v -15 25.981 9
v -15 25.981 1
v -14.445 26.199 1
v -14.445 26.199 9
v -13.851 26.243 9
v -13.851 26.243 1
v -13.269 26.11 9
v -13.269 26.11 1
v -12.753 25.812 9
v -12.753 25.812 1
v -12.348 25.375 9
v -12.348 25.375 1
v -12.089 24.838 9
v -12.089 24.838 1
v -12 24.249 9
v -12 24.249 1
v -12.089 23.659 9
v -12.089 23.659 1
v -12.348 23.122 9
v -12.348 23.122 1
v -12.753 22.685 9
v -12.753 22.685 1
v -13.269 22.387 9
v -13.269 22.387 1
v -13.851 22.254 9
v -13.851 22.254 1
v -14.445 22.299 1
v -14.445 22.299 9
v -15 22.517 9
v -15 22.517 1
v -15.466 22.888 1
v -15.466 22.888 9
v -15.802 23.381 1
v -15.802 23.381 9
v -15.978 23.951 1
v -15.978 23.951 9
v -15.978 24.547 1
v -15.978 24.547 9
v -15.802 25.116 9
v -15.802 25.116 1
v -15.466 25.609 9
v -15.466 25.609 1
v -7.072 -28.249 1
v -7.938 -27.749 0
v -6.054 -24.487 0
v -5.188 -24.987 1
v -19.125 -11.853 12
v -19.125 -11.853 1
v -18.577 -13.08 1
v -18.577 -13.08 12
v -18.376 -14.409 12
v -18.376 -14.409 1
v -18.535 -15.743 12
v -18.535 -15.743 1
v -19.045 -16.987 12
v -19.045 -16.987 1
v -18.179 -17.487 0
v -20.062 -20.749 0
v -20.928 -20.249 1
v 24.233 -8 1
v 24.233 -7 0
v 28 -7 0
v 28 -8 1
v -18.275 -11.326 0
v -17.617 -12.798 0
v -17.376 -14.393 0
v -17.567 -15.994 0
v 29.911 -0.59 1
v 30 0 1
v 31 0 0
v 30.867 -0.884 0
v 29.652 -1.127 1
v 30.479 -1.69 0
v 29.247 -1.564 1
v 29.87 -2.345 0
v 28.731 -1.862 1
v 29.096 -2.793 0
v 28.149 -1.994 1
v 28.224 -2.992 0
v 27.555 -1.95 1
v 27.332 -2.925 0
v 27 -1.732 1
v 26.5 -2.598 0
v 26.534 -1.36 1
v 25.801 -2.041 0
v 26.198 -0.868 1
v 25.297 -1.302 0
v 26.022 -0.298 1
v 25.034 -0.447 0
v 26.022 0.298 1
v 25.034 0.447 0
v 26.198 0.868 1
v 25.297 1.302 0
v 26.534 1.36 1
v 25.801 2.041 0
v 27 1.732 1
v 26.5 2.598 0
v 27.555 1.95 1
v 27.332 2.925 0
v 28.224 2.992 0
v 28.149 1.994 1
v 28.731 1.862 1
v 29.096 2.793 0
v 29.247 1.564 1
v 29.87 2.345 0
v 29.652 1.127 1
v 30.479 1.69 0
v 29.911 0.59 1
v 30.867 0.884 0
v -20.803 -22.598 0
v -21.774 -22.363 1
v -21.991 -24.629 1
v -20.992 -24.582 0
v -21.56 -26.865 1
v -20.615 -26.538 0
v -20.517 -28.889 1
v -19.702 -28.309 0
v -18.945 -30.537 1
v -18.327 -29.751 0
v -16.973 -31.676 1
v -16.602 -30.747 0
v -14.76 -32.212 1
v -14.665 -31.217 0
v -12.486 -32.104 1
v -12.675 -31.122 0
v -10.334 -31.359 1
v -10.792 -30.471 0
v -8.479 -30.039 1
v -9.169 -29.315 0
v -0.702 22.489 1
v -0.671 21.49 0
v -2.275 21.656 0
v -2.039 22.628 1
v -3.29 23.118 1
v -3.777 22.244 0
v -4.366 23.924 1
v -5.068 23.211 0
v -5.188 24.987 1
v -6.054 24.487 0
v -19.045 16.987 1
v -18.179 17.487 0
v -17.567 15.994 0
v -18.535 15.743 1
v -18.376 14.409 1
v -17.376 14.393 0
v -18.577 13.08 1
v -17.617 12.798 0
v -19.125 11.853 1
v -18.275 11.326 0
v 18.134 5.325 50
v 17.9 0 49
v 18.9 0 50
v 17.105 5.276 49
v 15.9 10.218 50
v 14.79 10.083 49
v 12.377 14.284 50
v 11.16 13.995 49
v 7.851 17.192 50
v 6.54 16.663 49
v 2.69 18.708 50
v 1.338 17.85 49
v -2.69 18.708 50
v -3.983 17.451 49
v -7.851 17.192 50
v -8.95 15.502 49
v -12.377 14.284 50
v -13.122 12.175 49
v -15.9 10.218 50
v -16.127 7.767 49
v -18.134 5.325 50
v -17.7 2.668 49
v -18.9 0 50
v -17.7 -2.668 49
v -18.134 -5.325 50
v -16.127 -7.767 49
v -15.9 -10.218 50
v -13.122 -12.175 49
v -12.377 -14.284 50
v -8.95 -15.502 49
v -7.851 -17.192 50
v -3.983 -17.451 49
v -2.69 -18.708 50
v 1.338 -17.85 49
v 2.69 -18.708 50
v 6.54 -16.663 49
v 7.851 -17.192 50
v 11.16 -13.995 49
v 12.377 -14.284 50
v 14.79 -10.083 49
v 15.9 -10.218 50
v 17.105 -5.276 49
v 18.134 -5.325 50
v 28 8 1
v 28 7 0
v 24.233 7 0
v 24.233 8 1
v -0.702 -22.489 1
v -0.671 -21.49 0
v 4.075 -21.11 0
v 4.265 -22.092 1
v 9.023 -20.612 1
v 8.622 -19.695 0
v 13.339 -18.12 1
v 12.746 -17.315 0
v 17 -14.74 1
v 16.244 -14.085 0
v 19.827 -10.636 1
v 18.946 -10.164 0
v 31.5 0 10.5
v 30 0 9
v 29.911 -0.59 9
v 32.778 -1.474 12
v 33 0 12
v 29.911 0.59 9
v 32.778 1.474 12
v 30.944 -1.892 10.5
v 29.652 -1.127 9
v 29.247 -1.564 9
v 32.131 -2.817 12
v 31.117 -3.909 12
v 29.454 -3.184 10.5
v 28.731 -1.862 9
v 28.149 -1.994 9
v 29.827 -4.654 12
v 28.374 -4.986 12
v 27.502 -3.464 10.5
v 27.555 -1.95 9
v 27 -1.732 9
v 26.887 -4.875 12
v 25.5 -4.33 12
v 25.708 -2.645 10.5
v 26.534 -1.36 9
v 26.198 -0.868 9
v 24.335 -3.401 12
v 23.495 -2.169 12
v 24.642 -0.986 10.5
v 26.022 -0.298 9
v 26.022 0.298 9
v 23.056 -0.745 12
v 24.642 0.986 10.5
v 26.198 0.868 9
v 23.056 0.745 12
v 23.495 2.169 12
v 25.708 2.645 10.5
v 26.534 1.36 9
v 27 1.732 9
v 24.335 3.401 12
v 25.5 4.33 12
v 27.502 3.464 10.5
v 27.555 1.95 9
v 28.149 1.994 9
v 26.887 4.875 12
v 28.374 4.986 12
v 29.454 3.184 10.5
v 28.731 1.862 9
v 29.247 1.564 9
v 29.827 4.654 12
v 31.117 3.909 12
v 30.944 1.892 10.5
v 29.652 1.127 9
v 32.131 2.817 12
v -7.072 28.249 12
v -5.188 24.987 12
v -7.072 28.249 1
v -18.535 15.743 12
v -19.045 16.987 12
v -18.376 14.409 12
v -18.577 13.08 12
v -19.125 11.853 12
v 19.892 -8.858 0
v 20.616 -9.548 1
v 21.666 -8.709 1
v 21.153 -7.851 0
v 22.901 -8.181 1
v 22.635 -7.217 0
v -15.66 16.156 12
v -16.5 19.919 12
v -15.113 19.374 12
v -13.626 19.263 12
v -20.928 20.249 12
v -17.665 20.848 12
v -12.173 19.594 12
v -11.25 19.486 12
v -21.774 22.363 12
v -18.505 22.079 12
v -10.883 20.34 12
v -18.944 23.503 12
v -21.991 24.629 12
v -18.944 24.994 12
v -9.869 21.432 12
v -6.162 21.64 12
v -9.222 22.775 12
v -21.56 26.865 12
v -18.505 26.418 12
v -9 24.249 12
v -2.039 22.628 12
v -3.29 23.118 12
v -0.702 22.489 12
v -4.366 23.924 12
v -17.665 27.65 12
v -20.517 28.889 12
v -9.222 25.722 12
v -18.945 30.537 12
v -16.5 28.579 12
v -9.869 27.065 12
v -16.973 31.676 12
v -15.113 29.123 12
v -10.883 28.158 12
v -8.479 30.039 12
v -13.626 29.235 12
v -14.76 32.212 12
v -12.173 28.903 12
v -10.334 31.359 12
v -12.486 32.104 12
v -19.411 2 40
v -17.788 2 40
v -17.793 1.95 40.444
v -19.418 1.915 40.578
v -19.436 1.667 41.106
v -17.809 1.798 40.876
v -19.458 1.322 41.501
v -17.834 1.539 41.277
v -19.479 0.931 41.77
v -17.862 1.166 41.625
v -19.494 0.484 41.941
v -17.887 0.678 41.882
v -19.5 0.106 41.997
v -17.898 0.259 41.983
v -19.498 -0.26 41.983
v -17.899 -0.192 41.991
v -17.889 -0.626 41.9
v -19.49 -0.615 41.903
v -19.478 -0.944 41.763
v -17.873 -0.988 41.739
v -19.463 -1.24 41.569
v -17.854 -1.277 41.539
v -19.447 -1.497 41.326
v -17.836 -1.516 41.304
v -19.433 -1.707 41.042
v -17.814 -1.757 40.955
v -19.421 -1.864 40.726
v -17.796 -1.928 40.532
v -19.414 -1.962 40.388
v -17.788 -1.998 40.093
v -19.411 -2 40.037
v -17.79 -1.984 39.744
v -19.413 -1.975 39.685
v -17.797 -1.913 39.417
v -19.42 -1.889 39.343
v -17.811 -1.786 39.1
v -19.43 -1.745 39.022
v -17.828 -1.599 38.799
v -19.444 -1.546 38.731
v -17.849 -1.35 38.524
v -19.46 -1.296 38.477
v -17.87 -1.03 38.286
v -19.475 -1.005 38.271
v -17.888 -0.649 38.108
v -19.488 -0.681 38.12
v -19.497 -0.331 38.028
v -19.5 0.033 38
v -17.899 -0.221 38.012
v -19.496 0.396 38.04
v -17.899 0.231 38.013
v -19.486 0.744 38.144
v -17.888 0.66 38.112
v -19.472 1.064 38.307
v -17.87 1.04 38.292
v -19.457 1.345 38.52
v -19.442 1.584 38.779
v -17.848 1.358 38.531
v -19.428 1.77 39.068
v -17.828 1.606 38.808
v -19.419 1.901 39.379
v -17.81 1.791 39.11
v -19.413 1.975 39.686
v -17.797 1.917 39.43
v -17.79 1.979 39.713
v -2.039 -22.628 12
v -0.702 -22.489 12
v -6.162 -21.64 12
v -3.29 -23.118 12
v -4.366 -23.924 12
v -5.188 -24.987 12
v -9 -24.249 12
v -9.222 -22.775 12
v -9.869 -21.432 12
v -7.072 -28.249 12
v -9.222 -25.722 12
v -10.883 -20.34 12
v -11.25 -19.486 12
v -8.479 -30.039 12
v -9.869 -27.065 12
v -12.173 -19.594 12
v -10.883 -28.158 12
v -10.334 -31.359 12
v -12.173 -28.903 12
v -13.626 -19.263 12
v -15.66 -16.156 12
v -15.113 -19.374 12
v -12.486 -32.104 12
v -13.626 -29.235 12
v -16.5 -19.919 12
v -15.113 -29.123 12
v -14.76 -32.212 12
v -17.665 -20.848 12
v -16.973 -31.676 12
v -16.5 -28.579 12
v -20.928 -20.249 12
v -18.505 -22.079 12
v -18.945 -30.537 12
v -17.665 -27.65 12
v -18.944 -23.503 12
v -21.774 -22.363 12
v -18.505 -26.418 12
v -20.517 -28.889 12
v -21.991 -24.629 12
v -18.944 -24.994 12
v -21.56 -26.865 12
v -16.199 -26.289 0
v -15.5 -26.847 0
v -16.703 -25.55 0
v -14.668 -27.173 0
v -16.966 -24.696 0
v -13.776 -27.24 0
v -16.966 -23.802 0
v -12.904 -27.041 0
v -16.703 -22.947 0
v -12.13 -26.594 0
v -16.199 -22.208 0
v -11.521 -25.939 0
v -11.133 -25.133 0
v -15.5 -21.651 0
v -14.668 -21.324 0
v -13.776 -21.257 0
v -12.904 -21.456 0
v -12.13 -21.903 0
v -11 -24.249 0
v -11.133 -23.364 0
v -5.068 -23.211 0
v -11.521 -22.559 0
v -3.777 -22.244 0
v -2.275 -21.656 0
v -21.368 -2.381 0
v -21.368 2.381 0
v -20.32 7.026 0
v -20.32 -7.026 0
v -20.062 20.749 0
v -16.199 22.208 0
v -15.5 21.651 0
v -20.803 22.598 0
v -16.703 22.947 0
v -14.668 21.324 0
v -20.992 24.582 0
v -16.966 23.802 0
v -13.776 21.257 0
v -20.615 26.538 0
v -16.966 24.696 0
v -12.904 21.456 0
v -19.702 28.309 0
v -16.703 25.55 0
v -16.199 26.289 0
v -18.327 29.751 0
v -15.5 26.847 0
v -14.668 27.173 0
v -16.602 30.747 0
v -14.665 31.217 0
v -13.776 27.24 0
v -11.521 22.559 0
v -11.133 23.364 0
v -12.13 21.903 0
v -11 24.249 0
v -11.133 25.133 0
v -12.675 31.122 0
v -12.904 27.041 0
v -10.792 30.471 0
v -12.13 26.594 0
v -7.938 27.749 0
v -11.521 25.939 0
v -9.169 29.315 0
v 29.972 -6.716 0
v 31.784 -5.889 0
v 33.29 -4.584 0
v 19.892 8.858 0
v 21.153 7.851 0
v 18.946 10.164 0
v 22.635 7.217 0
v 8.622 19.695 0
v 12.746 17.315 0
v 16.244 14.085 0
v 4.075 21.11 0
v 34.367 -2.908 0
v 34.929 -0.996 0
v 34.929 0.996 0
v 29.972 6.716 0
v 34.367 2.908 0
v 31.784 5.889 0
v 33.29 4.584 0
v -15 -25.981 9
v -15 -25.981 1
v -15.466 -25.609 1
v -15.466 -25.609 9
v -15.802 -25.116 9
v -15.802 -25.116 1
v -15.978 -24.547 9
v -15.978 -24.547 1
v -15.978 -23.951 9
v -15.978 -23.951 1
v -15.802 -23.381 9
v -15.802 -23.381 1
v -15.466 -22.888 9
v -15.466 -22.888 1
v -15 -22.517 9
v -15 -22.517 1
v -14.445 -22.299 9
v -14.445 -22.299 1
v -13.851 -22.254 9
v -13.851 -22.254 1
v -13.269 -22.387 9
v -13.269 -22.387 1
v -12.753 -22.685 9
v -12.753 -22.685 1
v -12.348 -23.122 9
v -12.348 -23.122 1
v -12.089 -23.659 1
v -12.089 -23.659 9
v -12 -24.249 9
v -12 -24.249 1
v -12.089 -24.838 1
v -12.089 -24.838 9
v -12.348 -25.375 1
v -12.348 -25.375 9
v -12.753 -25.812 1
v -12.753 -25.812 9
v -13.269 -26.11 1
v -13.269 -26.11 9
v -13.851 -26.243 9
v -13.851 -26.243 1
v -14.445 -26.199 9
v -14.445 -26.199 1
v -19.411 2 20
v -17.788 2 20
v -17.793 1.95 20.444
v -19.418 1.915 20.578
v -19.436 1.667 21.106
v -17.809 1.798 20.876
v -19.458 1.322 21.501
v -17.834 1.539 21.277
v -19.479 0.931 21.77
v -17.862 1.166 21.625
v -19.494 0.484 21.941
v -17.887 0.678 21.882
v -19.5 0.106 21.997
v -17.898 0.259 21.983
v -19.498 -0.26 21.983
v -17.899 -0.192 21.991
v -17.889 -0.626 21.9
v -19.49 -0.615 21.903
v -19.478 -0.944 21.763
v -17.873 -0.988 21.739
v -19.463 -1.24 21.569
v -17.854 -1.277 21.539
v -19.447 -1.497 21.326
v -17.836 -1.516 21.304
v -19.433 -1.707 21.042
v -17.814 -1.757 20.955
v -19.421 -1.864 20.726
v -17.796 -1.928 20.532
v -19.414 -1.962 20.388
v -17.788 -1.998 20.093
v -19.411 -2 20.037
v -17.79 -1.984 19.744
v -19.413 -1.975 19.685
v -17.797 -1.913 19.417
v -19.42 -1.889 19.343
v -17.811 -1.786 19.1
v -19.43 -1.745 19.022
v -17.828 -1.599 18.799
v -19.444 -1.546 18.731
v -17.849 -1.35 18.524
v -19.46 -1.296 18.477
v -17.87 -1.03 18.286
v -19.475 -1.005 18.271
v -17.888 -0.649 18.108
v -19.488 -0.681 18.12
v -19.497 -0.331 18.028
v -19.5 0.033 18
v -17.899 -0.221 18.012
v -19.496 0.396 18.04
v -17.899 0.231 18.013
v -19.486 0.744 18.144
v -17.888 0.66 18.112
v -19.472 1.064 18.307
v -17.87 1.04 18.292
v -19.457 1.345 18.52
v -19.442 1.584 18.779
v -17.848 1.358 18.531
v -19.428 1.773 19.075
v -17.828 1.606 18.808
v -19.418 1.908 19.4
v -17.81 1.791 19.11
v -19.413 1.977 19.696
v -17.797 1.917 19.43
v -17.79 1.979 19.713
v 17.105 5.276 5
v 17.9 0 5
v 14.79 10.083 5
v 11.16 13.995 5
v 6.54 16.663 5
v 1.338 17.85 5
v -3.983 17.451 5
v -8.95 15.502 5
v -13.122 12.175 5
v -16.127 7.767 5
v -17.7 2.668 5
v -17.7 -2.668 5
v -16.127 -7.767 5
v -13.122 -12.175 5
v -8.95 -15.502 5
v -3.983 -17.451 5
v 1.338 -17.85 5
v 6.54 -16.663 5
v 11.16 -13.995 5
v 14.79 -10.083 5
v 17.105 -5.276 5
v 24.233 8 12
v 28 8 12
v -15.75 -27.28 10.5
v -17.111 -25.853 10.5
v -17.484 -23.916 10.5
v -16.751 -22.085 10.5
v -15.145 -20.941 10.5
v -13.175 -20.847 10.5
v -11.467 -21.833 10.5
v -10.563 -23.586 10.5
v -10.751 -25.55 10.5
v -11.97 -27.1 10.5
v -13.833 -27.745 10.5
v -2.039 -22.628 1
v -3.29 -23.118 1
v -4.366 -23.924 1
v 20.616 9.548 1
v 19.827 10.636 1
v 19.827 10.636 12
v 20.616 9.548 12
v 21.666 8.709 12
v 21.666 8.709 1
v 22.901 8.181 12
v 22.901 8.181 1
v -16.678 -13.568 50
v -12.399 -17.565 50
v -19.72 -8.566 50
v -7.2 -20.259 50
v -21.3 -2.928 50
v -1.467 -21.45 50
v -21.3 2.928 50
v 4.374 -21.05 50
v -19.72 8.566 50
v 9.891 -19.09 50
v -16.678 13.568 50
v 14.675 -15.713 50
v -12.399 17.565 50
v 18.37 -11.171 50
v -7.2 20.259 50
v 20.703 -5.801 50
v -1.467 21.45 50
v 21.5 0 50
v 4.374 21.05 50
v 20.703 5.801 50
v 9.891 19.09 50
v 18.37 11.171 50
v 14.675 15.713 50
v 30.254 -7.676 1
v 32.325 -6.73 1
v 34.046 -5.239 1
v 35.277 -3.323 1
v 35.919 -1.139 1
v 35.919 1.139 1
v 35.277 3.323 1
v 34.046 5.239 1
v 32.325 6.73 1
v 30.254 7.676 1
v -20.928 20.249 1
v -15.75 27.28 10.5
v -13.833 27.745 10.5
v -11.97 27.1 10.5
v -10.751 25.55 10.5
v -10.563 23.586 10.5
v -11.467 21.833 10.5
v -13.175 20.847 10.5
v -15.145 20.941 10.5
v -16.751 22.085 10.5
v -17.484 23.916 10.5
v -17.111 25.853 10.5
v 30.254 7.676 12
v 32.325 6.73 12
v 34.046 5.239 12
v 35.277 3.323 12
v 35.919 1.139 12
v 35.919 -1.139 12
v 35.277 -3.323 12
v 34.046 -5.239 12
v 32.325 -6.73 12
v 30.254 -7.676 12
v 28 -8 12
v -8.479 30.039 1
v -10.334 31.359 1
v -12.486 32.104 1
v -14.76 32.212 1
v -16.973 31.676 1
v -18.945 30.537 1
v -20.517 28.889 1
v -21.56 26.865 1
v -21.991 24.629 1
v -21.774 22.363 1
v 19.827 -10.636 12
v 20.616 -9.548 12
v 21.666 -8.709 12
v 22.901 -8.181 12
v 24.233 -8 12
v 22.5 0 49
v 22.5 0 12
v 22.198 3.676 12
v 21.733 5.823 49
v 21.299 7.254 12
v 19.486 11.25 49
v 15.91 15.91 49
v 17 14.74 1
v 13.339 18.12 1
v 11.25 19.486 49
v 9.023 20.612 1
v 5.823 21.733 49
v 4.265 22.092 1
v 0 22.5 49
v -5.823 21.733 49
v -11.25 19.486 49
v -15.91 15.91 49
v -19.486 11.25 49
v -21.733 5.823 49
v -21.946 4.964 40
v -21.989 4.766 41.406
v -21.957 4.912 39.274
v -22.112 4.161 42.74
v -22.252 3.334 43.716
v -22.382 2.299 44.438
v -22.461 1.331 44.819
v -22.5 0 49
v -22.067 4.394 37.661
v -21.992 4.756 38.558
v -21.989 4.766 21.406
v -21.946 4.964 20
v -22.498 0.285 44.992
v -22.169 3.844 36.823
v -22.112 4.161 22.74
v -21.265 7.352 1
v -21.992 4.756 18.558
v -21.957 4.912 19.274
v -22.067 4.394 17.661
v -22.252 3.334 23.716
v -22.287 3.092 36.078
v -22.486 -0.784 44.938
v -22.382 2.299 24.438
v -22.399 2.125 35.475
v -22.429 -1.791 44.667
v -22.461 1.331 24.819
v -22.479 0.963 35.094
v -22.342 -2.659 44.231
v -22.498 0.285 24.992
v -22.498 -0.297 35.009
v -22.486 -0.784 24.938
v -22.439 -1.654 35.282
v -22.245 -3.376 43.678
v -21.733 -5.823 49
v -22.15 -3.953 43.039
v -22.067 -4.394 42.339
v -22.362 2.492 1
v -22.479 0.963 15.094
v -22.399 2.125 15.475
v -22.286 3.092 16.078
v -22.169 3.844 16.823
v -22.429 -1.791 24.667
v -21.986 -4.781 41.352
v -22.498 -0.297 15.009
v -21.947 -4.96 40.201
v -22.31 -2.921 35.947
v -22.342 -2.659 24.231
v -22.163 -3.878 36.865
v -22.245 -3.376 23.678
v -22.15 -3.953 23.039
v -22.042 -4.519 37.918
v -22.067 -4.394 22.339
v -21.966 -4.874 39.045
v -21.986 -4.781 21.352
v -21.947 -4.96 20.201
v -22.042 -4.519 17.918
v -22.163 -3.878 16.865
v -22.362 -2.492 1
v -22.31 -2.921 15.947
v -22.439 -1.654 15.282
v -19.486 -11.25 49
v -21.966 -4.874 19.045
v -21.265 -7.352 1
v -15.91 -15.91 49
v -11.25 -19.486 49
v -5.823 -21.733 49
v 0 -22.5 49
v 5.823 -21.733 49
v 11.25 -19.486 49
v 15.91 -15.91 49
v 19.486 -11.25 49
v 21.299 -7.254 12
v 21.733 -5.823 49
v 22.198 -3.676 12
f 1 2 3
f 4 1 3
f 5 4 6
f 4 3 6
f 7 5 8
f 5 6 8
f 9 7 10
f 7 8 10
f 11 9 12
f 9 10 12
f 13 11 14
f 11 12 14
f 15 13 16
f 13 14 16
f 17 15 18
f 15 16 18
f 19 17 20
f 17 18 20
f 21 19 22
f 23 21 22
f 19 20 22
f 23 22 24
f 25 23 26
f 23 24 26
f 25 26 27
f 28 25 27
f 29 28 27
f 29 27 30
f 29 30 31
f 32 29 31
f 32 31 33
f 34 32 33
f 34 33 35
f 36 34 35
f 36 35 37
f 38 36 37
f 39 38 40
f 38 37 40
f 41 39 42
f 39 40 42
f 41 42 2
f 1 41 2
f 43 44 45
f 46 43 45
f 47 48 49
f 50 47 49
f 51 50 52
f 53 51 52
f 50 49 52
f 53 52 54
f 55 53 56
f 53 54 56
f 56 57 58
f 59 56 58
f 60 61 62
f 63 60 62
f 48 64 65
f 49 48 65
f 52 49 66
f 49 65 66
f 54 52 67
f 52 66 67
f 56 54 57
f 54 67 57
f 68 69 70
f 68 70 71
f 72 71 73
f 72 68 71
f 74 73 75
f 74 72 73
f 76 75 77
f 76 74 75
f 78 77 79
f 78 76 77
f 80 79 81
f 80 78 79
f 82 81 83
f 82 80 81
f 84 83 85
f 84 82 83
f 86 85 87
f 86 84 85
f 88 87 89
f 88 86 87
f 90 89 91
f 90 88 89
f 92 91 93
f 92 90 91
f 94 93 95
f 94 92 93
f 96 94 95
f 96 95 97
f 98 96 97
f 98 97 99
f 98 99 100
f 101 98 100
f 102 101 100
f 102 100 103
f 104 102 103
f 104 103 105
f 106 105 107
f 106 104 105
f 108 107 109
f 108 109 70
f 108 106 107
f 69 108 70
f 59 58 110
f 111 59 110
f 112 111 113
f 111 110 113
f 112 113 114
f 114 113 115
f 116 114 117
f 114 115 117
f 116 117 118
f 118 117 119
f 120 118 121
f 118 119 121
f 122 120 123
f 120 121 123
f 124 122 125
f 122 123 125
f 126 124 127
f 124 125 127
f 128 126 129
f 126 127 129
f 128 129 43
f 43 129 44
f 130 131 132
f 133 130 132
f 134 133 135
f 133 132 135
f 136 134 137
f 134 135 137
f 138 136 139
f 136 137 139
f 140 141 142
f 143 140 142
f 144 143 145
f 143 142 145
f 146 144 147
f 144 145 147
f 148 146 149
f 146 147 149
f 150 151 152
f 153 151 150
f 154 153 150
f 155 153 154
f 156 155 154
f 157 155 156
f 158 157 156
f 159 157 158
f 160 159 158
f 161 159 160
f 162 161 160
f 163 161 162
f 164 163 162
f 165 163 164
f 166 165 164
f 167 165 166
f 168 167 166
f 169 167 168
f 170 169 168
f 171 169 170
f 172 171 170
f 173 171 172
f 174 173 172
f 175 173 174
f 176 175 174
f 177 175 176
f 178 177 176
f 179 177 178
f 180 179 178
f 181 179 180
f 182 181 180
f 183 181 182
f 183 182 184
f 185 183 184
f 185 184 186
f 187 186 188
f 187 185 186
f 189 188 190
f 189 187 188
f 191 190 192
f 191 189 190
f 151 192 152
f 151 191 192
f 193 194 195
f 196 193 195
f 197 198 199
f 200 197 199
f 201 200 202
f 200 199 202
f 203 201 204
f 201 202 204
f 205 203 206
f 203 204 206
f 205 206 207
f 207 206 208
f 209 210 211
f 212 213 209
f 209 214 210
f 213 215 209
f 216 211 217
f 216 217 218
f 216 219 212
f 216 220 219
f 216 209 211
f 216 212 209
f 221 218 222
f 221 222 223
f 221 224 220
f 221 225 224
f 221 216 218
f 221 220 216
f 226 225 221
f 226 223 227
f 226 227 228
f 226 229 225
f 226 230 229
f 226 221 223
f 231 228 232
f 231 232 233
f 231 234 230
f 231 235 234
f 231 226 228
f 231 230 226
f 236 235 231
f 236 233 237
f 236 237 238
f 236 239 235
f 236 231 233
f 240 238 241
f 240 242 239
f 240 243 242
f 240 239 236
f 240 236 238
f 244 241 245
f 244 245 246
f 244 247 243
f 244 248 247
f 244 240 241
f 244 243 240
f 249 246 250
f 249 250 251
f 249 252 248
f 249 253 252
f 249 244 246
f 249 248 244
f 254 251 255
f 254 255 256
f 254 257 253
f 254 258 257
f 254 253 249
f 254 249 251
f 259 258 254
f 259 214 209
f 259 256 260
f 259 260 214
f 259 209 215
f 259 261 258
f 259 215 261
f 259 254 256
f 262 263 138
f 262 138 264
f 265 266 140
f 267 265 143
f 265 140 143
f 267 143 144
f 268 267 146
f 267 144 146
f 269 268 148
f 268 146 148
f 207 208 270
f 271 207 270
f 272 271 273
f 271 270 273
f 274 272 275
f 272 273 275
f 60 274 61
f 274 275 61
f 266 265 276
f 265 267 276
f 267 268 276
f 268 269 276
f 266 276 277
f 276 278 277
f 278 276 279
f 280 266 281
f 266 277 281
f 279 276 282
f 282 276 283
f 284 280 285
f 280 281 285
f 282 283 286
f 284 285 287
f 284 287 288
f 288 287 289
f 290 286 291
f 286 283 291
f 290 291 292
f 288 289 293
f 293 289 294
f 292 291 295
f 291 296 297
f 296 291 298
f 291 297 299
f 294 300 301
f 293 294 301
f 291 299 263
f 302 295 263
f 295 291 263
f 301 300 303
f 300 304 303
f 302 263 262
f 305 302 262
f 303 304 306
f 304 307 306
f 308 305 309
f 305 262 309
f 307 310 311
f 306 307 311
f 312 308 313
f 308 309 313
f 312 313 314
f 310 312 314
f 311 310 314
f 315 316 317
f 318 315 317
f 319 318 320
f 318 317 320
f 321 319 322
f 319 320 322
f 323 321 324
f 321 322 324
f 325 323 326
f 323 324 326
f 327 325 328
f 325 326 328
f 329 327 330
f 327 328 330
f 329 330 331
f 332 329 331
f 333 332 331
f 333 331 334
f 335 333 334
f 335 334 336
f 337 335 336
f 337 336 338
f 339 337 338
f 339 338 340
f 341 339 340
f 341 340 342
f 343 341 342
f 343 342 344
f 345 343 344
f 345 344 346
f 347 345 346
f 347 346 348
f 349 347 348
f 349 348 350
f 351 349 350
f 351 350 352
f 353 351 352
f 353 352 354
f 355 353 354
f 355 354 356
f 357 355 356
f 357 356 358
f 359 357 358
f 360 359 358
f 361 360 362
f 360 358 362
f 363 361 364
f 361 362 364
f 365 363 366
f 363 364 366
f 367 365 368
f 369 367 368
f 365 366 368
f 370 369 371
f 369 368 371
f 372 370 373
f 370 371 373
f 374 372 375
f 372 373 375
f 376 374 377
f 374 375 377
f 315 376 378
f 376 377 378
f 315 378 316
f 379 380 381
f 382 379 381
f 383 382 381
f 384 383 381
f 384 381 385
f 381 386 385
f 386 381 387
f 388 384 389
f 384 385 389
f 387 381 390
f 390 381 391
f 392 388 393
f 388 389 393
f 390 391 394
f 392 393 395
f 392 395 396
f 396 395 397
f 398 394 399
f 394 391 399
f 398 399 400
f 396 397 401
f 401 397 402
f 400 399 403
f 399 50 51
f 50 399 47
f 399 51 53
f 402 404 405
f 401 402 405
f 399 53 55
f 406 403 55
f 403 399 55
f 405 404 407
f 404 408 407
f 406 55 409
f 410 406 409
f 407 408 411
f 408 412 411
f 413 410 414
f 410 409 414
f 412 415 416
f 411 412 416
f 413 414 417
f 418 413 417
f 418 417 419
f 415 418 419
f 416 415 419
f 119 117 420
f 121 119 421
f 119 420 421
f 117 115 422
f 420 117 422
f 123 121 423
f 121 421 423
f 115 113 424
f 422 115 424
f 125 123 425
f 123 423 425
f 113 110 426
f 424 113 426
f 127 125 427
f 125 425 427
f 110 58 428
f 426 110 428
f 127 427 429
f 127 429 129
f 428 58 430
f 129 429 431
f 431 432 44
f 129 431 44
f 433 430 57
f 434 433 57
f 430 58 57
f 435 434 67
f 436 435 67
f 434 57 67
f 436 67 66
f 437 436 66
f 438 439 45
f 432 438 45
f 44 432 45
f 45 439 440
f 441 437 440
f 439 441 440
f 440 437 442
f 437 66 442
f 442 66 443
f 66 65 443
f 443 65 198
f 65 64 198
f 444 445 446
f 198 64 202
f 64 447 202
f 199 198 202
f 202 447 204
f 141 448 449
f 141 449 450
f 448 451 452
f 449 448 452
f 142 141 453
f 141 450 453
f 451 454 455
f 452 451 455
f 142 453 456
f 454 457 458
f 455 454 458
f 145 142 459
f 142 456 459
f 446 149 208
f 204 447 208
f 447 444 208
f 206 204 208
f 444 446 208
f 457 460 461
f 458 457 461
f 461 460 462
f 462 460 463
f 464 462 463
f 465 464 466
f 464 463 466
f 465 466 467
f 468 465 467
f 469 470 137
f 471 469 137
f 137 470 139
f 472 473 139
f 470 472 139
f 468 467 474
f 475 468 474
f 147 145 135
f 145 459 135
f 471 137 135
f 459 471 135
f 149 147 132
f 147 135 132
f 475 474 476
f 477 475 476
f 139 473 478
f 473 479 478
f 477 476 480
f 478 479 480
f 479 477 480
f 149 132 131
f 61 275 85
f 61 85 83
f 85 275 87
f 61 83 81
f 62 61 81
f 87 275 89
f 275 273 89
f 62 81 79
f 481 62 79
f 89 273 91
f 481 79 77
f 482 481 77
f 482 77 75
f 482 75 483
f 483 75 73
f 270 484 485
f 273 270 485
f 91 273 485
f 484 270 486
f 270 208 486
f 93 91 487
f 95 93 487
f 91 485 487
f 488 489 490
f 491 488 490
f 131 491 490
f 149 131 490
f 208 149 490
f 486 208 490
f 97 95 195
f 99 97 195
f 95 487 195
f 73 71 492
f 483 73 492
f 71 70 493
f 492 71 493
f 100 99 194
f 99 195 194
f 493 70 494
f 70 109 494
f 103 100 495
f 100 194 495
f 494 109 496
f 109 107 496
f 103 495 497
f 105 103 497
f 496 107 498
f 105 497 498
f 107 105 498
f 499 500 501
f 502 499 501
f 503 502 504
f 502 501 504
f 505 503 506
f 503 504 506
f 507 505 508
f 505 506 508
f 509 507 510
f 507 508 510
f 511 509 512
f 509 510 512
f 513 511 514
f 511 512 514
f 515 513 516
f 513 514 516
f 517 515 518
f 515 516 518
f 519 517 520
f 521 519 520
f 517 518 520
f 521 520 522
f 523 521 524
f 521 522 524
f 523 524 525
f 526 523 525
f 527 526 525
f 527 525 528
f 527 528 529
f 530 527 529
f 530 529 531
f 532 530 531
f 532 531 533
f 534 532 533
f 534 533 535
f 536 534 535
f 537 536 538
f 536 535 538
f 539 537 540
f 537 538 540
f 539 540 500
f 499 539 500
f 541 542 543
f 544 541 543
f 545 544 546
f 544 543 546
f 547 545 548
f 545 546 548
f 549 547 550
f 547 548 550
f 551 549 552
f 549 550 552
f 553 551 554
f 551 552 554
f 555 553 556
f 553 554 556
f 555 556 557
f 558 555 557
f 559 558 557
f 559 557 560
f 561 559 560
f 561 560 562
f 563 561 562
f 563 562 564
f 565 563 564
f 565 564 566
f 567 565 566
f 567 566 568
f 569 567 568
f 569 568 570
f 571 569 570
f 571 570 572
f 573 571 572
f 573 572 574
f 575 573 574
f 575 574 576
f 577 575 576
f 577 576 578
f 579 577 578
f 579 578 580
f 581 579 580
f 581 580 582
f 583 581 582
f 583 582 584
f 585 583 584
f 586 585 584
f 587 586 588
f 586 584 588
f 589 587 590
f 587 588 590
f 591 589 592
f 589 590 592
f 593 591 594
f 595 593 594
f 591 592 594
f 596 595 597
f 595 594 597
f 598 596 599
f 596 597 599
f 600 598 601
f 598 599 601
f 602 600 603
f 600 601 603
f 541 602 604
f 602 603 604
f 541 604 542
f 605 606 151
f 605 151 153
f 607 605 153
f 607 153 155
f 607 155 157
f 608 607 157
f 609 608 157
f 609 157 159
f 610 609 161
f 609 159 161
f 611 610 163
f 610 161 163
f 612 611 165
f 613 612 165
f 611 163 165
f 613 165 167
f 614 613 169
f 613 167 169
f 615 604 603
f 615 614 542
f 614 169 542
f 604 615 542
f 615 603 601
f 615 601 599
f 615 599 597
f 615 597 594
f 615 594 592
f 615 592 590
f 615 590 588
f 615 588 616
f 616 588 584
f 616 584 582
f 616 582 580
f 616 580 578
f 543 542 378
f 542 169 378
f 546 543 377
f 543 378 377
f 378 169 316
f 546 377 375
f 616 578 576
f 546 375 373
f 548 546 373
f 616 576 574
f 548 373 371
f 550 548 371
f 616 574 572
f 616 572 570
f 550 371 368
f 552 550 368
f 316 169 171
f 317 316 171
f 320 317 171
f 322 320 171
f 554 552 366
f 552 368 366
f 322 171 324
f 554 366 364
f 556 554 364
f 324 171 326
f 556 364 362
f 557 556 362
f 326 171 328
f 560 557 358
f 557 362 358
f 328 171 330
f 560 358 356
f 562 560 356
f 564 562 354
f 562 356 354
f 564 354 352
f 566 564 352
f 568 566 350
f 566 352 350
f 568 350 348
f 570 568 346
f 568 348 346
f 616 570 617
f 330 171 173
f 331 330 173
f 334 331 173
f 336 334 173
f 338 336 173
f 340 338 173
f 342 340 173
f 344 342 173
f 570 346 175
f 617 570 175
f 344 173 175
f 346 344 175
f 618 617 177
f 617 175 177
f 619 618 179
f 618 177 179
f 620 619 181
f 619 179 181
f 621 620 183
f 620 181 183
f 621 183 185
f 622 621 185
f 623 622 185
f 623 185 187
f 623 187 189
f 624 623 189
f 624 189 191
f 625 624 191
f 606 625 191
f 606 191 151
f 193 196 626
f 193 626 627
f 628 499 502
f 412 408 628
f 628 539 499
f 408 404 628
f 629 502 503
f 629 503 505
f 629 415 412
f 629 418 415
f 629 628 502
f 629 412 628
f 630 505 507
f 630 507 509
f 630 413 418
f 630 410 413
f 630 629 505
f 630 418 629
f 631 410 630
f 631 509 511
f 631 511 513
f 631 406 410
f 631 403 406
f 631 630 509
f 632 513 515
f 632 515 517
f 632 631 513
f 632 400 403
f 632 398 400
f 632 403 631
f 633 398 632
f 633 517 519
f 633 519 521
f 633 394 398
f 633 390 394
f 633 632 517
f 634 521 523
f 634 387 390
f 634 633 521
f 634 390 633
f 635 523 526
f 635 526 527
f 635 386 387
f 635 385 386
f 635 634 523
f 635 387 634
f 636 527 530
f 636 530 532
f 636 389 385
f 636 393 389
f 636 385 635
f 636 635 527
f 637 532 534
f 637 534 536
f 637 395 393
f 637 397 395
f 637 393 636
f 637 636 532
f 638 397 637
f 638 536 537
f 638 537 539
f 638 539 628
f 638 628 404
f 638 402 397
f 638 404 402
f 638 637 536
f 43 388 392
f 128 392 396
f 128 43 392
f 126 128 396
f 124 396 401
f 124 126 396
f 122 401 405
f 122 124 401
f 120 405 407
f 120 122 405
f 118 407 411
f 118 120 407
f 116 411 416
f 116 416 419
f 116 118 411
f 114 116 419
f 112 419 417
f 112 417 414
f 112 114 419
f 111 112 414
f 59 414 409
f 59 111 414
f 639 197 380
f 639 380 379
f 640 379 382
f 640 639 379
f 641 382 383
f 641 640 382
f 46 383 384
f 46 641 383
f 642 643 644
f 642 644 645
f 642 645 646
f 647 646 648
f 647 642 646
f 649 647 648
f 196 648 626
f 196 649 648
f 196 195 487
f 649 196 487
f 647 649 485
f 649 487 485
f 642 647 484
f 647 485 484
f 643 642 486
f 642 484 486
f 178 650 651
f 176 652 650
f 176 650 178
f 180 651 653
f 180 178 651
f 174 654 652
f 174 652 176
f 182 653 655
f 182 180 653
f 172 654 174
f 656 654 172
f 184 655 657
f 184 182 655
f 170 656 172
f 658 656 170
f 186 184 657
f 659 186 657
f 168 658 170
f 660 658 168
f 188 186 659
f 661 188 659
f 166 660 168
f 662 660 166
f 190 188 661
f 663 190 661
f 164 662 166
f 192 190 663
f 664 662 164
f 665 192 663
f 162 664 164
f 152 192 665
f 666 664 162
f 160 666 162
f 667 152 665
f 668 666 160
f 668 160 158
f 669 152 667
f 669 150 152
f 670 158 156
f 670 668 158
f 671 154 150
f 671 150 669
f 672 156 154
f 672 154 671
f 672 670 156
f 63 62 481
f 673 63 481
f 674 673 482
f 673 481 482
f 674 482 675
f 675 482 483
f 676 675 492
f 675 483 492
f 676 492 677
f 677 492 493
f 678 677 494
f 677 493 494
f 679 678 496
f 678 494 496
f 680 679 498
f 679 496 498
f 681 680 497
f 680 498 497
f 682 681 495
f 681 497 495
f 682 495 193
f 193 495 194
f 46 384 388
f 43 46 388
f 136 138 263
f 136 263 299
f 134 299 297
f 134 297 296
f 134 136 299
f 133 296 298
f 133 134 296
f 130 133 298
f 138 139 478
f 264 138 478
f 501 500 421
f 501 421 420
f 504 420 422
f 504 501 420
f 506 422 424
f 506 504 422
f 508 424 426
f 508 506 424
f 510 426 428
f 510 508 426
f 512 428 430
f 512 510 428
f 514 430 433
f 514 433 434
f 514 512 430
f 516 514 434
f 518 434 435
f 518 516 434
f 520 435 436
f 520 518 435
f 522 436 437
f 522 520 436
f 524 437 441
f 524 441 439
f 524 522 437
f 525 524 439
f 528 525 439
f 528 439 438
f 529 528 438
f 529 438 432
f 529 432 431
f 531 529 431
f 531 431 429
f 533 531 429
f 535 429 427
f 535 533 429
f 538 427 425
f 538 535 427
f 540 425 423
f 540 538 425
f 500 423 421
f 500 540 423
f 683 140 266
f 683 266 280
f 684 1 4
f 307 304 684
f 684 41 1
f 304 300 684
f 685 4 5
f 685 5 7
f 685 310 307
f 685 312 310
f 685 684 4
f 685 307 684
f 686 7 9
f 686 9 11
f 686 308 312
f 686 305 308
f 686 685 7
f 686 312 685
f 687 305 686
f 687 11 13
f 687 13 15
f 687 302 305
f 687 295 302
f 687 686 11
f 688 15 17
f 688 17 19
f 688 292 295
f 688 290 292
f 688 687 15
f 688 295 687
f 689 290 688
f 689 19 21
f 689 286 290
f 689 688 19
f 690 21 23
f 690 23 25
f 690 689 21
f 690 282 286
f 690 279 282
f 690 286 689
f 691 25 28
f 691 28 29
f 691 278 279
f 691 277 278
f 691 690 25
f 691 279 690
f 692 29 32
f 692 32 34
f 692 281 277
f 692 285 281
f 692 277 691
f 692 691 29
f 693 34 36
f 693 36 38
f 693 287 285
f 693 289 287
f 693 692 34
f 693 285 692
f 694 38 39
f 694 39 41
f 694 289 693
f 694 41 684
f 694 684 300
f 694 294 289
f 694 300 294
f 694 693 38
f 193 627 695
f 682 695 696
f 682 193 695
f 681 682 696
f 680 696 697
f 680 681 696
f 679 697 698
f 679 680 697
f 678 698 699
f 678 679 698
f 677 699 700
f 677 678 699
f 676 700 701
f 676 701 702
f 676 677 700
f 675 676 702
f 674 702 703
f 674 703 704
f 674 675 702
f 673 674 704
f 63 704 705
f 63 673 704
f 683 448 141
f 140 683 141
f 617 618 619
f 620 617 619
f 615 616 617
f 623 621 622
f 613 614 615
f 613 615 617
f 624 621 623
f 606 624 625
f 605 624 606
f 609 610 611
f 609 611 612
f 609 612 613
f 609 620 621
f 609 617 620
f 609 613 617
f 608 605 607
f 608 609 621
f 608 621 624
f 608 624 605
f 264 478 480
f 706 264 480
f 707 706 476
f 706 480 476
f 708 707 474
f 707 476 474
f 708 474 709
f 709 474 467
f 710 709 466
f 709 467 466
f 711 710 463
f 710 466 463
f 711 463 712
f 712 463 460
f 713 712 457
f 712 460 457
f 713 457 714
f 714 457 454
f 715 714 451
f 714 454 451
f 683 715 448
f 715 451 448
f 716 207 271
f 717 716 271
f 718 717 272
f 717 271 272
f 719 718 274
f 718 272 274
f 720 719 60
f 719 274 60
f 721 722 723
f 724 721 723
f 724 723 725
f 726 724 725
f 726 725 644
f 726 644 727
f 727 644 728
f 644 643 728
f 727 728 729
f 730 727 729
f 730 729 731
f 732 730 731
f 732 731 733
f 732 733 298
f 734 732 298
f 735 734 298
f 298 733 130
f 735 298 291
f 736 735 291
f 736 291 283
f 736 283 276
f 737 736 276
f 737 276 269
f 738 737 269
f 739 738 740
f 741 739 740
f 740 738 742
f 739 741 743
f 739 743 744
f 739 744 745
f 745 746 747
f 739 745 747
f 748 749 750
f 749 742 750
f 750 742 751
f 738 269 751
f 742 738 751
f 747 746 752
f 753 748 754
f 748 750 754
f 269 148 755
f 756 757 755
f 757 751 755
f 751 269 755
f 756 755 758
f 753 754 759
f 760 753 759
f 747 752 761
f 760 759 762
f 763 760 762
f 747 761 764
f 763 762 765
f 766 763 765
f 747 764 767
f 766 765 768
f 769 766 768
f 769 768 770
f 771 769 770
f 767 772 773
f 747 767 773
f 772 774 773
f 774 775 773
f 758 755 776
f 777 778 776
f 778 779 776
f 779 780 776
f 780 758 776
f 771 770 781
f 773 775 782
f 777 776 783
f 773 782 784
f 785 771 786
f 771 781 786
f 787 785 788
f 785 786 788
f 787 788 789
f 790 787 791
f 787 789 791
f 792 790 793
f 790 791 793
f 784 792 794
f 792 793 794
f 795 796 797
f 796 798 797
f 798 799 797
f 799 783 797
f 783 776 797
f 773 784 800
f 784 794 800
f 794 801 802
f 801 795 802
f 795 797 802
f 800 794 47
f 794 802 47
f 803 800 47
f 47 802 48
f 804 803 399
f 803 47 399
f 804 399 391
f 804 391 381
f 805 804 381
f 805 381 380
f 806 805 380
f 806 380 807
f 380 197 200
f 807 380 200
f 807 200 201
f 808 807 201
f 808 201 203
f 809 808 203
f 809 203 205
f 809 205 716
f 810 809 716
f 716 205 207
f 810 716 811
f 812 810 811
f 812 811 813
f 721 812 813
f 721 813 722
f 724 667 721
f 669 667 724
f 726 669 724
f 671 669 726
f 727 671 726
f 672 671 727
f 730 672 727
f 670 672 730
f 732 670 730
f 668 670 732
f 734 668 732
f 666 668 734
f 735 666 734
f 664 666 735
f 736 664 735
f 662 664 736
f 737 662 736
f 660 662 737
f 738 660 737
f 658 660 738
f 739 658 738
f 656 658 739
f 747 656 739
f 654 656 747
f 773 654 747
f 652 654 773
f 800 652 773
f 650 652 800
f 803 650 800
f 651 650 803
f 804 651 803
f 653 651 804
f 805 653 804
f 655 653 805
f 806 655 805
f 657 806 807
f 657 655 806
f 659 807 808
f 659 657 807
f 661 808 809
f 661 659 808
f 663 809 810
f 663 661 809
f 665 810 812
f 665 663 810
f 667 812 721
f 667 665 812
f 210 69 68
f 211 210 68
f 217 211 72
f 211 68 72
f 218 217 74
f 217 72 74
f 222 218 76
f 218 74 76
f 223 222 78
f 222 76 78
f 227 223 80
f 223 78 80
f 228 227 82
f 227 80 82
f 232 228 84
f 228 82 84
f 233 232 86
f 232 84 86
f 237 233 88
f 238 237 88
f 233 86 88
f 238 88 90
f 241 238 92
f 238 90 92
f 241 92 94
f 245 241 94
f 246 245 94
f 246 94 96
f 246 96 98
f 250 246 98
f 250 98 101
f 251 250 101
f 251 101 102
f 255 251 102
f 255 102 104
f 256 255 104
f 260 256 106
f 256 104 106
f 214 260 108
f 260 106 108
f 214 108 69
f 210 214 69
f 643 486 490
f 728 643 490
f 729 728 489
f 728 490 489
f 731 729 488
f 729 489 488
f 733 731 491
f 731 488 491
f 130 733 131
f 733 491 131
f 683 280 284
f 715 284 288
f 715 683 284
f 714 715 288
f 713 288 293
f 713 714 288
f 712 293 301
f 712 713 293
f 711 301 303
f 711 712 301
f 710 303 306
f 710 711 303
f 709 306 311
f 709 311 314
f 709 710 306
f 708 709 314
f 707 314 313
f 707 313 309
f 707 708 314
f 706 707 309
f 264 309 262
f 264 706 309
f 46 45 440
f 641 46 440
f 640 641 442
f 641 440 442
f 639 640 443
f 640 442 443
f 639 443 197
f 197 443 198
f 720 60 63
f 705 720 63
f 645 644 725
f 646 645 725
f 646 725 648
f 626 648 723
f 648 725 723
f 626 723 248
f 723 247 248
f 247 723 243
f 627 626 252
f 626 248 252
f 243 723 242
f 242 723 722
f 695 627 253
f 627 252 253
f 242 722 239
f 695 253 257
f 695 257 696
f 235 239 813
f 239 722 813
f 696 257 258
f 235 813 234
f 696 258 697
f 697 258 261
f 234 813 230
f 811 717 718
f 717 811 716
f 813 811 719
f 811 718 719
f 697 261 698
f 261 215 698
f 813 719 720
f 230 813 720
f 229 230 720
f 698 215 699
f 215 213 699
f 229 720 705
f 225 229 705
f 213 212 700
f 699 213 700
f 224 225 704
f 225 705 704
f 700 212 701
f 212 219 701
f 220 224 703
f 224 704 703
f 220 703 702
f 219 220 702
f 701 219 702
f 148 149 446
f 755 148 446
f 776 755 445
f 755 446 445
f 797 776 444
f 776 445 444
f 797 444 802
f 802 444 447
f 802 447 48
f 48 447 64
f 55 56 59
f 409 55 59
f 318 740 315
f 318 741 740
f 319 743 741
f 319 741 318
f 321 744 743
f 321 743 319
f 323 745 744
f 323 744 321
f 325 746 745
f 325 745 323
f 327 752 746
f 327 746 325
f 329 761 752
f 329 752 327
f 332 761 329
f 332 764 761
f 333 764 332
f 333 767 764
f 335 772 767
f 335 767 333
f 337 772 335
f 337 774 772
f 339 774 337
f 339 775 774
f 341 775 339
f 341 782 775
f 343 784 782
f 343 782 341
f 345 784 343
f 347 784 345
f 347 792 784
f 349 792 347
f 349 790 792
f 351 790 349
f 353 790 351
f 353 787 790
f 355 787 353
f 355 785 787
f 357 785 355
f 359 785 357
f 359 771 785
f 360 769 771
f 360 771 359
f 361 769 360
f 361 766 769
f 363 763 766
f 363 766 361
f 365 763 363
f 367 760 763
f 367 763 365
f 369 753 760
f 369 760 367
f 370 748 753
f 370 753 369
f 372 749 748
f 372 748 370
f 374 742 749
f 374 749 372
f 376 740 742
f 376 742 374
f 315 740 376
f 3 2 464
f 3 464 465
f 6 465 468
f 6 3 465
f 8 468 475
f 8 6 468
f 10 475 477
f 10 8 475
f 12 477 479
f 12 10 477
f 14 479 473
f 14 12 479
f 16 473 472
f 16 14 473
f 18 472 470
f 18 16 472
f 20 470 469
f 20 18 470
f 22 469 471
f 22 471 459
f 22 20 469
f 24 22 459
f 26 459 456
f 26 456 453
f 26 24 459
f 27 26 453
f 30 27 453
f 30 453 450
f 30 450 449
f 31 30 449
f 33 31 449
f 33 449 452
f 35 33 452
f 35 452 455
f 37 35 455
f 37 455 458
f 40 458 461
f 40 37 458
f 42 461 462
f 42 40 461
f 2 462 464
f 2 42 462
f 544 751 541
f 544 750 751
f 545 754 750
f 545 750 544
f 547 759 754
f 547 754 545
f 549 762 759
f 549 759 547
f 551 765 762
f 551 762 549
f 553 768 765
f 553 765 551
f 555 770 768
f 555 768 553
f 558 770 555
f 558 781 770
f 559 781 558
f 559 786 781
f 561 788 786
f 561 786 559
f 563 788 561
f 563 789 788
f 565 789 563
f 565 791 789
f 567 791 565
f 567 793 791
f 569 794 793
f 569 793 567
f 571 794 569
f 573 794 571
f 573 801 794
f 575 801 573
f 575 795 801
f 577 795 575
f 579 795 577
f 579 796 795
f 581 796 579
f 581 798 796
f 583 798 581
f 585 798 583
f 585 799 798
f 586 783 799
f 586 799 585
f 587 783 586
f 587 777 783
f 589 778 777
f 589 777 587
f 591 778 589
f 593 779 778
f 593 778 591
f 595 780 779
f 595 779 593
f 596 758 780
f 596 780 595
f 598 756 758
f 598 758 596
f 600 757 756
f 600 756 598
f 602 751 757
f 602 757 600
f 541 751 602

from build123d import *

# Parameters (mm, degrees)
SKETCH_R           = 22.5
PAD_DEPTH          = 50
SKETCH002_R        = 2
PAD001_DEPTH       = 12
POLARPATTERN_COUNT = 3
CHAMFER_SIZE       = 3
FILLET_R           = 5
SKETCH001_R        = 17.9
POCKET_DEPTH       = 45
CHAMFER001_SIZE    = 1
CHAMFER002_SIZE    = 1
SKETCH003_R        = 2
POCKET001_DEPTH    = 22.501
CHAMFER003_SIZE    = 3


with BuildPart() as part:
    # Sketch (on XY_Plane of Origin) → Pad (new body)
    with BuildSketch(Plane.XY):
        Circle(SKETCH_R)
    extrude(amount=PAD_DEPTH)

    # Sketch002 (on Face2 of Pad) → Pad001 (join)
    with BuildSketch(Plane(origin=(0, 0, 0), x_dir=(1, 0, 0), z_dir=(0, 0, -1))):
        with BuildLine():
            ThreePointArc((0, 8), (-8, 0), (0, -8))
            Line((0, -8), (28, -8))
            ThreePointArc((28, -8), (36, 0), (28, 8))
            Line((0, 8), (28, 8))
        make_face()
        with Locations((28, 0)):
            Circle(SKETCH002_R, mode=Mode.SUBTRACT)
    pad001 = extrude(amount=-PAD001_DEPTH)

    # PolarPattern: Pad001 ×3 about axis
    polarpattern_axis = Axis((0, 0, 0), (0, 0, -1))
    for i in range(1, POLARPATTERN_COUNT):
        add(pad001.rotate(polarpattern_axis, i * 360 / POLARPATTERN_COUNT))

    # Chamfer
    chamfer_edges = [part.edges().sort_by_distance(p)[0] for p in [
        (26, 0, 12),
        (-13, 22.51666, 12),
        (-13, -22.51666, 12),
    ]]
    chamfer(chamfer_edges, length=CHAMFER_SIZE)

    # Fillet
    fillet_edges = [part.edges().sort_by_distance(p)[0] for p in [
        (21.029741, 8, 6),
        (-3.586667, 22.21229, 6),
        (-17.443074, 14.21229, 6),
        (-17.443074, -14.21229, 6),
        (-3.586667, -22.21229, 6),
        (21.029741, -8, 6),
    ]]
    fillet(fillet_edges, radius=FILLET_R)

    # Sketch001 (on Face3 of Pad) → Pocket (cut)
    with BuildSketch(Plane.XY.offset(50)):
        Circle(SKETCH001_R)
    extrude(amount=-POCKET_DEPTH, mode=Mode.SUBTRACT)

    # Chamfer001
    chamfer001_edges = [part.edges().sort_by_distance(p)[0] for p in [
        (-22.5, 0, 50),
        (-17.9, 0, 50),
    ]]
    chamfer(chamfer001_edges, length=CHAMFER001_SIZE)

    # Chamfer002
    chamfer002_edges = [part.edges().sort_by_distance(p)[0] for p in [
        (11.25, 19.485572, 0),
        (21.665965, 8.709418, 0),
        (-3.290405, 23.117985, 0),
        (26.116621, 8, 0),
        (-6.130107, 26.617657, 0),
        (36, 0, 0),
        (-18, 31.176915, 0),
        (26.116621, -8, 0),
        (-19.986514, 18.617657, 0),
        (21.665965, -8.709418, 0),
        (-18.37556, 14.408567, 0),
        (11.25, -19.485572, 0),
        (-22.5, 0, 0),
        (-3.290405, -23.117985, 0),
        (-18.37556, -14.408567, 0),
        (-6.130107, -26.617657, 0),
        (-19.986514, -18.617657, 0),
        (-18, -31.176915, 0),
        (-13, 22.51666, 0),
        (-13, -22.51666, 0),
        (26, 0, 0),
    ]]
    chamfer(chamfer002_edges, length=CHAMFER002_SIZE)

    # Sketch003 → Pocket001 (cut, through all)
    with BuildSketch(Plane.YZ):
        with Locations((0, 20)):
            Circle(SKETCH003_R)
        with Locations((0, 40)):
            Circle(SKETCH003_R)
    extrude(amount=-POCKET001_DEPTH, mode=Mode.SUBTRACT)

    # Chamfer003
    chamfer003_edges = [part.edges().sort_by_distance(p)[0] for p in [
        (-22.410935, -2, 40),
        (-22.410935, -2, 20),
    ]]
    chamfer(chamfer003_edges, length=CHAMFER003_SIZE)


solid = part.part
